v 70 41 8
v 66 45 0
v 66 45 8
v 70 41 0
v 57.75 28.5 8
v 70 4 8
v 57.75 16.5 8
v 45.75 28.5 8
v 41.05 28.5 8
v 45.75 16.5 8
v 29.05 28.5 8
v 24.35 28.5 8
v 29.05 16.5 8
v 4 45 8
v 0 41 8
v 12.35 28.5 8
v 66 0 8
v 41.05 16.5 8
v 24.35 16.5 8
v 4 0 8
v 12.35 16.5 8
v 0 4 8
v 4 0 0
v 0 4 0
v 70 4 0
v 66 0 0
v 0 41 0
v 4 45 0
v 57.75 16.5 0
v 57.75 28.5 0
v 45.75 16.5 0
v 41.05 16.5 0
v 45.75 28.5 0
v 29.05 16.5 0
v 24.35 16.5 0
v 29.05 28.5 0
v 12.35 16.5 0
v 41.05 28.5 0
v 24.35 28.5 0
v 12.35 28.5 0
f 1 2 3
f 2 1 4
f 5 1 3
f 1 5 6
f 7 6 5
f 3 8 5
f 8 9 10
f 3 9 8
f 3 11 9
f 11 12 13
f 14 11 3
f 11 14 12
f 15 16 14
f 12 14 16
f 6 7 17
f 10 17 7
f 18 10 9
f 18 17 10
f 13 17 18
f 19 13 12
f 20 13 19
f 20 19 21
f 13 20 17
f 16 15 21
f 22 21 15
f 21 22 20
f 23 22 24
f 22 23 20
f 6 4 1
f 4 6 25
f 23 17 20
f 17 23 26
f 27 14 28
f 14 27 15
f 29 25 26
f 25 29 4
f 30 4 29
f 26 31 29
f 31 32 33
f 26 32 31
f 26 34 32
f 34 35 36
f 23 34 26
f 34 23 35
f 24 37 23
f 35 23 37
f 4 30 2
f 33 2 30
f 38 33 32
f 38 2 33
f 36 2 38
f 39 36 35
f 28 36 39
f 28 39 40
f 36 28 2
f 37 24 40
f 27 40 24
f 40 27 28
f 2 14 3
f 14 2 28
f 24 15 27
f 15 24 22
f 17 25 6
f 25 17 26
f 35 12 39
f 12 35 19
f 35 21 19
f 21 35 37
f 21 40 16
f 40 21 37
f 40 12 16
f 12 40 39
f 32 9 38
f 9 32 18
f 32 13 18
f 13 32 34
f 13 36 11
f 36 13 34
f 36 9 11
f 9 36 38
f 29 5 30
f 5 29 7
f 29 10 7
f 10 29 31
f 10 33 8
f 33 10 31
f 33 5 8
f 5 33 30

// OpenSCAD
$fn = 32;

// ----------------------------------------------------------------------
// Windowed plate: 3 voids, 70 x 45 x 8 mm
// ----------------------------------------------------------------------

// --- parameters (mm) ---
plate_l = 70;             // plate length, X
plate_w = 45;             // plate width, Y
plate_t = 8;              // plate thickness, Z
edge_margin = 10;         // wall from the plate edge to any window
windows = 3;              // number of windows in the row
win_l = 12;               // window length
win_w = 12;               // window width
win_pitch = 16.7;         // window pitch along X
depth_1 = 8;              // depth of void 1 (full thickness = through)
depth_2 = 8;              // depth of void 2 (full thickness = through)
depth_3 = 8;              // depth of void 3 (full thickness = through)
corner_c = 4;             // corner chamfer of the plate

profile = [[4, 0], [66, 0], [70, 4], [70, 41], [66, 45], [4, 45], [0, 41], [0, 4]];  // primary outline, 8 points, counter clockwise
void_1 = [[12.35, 16.5], [24.35, 16.5], [24.35, 28.5], [12.35, 28.5]];  // window 1 of the row, 4 points
void_2 = [[29.05, 16.5], [41.05, 16.5], [41.05, 28.5], [29.05, 28.5]];  // window 2 of the row, 4 points
void_3 = [[45.75, 16.5], [57.75, 16.5], [57.75, 28.5], [45.75, 28.5]];  // window 3 of the row, 4 points

// --- the one profile operation ---
difference() {
  linear_extrude(height = plate_t) polygon(points = profile);
  translate([0, 0, -1])
    linear_extrude(height = plate_t + 2) polygon(points = void_1);
  translate([0, 0, -1])
    linear_extrude(height = plate_t + 2) polygon(points = void_2);
  translate([0, 0, -1])
    linear_extrude(height = plate_t + 2) polygon(points = void_3);
}
